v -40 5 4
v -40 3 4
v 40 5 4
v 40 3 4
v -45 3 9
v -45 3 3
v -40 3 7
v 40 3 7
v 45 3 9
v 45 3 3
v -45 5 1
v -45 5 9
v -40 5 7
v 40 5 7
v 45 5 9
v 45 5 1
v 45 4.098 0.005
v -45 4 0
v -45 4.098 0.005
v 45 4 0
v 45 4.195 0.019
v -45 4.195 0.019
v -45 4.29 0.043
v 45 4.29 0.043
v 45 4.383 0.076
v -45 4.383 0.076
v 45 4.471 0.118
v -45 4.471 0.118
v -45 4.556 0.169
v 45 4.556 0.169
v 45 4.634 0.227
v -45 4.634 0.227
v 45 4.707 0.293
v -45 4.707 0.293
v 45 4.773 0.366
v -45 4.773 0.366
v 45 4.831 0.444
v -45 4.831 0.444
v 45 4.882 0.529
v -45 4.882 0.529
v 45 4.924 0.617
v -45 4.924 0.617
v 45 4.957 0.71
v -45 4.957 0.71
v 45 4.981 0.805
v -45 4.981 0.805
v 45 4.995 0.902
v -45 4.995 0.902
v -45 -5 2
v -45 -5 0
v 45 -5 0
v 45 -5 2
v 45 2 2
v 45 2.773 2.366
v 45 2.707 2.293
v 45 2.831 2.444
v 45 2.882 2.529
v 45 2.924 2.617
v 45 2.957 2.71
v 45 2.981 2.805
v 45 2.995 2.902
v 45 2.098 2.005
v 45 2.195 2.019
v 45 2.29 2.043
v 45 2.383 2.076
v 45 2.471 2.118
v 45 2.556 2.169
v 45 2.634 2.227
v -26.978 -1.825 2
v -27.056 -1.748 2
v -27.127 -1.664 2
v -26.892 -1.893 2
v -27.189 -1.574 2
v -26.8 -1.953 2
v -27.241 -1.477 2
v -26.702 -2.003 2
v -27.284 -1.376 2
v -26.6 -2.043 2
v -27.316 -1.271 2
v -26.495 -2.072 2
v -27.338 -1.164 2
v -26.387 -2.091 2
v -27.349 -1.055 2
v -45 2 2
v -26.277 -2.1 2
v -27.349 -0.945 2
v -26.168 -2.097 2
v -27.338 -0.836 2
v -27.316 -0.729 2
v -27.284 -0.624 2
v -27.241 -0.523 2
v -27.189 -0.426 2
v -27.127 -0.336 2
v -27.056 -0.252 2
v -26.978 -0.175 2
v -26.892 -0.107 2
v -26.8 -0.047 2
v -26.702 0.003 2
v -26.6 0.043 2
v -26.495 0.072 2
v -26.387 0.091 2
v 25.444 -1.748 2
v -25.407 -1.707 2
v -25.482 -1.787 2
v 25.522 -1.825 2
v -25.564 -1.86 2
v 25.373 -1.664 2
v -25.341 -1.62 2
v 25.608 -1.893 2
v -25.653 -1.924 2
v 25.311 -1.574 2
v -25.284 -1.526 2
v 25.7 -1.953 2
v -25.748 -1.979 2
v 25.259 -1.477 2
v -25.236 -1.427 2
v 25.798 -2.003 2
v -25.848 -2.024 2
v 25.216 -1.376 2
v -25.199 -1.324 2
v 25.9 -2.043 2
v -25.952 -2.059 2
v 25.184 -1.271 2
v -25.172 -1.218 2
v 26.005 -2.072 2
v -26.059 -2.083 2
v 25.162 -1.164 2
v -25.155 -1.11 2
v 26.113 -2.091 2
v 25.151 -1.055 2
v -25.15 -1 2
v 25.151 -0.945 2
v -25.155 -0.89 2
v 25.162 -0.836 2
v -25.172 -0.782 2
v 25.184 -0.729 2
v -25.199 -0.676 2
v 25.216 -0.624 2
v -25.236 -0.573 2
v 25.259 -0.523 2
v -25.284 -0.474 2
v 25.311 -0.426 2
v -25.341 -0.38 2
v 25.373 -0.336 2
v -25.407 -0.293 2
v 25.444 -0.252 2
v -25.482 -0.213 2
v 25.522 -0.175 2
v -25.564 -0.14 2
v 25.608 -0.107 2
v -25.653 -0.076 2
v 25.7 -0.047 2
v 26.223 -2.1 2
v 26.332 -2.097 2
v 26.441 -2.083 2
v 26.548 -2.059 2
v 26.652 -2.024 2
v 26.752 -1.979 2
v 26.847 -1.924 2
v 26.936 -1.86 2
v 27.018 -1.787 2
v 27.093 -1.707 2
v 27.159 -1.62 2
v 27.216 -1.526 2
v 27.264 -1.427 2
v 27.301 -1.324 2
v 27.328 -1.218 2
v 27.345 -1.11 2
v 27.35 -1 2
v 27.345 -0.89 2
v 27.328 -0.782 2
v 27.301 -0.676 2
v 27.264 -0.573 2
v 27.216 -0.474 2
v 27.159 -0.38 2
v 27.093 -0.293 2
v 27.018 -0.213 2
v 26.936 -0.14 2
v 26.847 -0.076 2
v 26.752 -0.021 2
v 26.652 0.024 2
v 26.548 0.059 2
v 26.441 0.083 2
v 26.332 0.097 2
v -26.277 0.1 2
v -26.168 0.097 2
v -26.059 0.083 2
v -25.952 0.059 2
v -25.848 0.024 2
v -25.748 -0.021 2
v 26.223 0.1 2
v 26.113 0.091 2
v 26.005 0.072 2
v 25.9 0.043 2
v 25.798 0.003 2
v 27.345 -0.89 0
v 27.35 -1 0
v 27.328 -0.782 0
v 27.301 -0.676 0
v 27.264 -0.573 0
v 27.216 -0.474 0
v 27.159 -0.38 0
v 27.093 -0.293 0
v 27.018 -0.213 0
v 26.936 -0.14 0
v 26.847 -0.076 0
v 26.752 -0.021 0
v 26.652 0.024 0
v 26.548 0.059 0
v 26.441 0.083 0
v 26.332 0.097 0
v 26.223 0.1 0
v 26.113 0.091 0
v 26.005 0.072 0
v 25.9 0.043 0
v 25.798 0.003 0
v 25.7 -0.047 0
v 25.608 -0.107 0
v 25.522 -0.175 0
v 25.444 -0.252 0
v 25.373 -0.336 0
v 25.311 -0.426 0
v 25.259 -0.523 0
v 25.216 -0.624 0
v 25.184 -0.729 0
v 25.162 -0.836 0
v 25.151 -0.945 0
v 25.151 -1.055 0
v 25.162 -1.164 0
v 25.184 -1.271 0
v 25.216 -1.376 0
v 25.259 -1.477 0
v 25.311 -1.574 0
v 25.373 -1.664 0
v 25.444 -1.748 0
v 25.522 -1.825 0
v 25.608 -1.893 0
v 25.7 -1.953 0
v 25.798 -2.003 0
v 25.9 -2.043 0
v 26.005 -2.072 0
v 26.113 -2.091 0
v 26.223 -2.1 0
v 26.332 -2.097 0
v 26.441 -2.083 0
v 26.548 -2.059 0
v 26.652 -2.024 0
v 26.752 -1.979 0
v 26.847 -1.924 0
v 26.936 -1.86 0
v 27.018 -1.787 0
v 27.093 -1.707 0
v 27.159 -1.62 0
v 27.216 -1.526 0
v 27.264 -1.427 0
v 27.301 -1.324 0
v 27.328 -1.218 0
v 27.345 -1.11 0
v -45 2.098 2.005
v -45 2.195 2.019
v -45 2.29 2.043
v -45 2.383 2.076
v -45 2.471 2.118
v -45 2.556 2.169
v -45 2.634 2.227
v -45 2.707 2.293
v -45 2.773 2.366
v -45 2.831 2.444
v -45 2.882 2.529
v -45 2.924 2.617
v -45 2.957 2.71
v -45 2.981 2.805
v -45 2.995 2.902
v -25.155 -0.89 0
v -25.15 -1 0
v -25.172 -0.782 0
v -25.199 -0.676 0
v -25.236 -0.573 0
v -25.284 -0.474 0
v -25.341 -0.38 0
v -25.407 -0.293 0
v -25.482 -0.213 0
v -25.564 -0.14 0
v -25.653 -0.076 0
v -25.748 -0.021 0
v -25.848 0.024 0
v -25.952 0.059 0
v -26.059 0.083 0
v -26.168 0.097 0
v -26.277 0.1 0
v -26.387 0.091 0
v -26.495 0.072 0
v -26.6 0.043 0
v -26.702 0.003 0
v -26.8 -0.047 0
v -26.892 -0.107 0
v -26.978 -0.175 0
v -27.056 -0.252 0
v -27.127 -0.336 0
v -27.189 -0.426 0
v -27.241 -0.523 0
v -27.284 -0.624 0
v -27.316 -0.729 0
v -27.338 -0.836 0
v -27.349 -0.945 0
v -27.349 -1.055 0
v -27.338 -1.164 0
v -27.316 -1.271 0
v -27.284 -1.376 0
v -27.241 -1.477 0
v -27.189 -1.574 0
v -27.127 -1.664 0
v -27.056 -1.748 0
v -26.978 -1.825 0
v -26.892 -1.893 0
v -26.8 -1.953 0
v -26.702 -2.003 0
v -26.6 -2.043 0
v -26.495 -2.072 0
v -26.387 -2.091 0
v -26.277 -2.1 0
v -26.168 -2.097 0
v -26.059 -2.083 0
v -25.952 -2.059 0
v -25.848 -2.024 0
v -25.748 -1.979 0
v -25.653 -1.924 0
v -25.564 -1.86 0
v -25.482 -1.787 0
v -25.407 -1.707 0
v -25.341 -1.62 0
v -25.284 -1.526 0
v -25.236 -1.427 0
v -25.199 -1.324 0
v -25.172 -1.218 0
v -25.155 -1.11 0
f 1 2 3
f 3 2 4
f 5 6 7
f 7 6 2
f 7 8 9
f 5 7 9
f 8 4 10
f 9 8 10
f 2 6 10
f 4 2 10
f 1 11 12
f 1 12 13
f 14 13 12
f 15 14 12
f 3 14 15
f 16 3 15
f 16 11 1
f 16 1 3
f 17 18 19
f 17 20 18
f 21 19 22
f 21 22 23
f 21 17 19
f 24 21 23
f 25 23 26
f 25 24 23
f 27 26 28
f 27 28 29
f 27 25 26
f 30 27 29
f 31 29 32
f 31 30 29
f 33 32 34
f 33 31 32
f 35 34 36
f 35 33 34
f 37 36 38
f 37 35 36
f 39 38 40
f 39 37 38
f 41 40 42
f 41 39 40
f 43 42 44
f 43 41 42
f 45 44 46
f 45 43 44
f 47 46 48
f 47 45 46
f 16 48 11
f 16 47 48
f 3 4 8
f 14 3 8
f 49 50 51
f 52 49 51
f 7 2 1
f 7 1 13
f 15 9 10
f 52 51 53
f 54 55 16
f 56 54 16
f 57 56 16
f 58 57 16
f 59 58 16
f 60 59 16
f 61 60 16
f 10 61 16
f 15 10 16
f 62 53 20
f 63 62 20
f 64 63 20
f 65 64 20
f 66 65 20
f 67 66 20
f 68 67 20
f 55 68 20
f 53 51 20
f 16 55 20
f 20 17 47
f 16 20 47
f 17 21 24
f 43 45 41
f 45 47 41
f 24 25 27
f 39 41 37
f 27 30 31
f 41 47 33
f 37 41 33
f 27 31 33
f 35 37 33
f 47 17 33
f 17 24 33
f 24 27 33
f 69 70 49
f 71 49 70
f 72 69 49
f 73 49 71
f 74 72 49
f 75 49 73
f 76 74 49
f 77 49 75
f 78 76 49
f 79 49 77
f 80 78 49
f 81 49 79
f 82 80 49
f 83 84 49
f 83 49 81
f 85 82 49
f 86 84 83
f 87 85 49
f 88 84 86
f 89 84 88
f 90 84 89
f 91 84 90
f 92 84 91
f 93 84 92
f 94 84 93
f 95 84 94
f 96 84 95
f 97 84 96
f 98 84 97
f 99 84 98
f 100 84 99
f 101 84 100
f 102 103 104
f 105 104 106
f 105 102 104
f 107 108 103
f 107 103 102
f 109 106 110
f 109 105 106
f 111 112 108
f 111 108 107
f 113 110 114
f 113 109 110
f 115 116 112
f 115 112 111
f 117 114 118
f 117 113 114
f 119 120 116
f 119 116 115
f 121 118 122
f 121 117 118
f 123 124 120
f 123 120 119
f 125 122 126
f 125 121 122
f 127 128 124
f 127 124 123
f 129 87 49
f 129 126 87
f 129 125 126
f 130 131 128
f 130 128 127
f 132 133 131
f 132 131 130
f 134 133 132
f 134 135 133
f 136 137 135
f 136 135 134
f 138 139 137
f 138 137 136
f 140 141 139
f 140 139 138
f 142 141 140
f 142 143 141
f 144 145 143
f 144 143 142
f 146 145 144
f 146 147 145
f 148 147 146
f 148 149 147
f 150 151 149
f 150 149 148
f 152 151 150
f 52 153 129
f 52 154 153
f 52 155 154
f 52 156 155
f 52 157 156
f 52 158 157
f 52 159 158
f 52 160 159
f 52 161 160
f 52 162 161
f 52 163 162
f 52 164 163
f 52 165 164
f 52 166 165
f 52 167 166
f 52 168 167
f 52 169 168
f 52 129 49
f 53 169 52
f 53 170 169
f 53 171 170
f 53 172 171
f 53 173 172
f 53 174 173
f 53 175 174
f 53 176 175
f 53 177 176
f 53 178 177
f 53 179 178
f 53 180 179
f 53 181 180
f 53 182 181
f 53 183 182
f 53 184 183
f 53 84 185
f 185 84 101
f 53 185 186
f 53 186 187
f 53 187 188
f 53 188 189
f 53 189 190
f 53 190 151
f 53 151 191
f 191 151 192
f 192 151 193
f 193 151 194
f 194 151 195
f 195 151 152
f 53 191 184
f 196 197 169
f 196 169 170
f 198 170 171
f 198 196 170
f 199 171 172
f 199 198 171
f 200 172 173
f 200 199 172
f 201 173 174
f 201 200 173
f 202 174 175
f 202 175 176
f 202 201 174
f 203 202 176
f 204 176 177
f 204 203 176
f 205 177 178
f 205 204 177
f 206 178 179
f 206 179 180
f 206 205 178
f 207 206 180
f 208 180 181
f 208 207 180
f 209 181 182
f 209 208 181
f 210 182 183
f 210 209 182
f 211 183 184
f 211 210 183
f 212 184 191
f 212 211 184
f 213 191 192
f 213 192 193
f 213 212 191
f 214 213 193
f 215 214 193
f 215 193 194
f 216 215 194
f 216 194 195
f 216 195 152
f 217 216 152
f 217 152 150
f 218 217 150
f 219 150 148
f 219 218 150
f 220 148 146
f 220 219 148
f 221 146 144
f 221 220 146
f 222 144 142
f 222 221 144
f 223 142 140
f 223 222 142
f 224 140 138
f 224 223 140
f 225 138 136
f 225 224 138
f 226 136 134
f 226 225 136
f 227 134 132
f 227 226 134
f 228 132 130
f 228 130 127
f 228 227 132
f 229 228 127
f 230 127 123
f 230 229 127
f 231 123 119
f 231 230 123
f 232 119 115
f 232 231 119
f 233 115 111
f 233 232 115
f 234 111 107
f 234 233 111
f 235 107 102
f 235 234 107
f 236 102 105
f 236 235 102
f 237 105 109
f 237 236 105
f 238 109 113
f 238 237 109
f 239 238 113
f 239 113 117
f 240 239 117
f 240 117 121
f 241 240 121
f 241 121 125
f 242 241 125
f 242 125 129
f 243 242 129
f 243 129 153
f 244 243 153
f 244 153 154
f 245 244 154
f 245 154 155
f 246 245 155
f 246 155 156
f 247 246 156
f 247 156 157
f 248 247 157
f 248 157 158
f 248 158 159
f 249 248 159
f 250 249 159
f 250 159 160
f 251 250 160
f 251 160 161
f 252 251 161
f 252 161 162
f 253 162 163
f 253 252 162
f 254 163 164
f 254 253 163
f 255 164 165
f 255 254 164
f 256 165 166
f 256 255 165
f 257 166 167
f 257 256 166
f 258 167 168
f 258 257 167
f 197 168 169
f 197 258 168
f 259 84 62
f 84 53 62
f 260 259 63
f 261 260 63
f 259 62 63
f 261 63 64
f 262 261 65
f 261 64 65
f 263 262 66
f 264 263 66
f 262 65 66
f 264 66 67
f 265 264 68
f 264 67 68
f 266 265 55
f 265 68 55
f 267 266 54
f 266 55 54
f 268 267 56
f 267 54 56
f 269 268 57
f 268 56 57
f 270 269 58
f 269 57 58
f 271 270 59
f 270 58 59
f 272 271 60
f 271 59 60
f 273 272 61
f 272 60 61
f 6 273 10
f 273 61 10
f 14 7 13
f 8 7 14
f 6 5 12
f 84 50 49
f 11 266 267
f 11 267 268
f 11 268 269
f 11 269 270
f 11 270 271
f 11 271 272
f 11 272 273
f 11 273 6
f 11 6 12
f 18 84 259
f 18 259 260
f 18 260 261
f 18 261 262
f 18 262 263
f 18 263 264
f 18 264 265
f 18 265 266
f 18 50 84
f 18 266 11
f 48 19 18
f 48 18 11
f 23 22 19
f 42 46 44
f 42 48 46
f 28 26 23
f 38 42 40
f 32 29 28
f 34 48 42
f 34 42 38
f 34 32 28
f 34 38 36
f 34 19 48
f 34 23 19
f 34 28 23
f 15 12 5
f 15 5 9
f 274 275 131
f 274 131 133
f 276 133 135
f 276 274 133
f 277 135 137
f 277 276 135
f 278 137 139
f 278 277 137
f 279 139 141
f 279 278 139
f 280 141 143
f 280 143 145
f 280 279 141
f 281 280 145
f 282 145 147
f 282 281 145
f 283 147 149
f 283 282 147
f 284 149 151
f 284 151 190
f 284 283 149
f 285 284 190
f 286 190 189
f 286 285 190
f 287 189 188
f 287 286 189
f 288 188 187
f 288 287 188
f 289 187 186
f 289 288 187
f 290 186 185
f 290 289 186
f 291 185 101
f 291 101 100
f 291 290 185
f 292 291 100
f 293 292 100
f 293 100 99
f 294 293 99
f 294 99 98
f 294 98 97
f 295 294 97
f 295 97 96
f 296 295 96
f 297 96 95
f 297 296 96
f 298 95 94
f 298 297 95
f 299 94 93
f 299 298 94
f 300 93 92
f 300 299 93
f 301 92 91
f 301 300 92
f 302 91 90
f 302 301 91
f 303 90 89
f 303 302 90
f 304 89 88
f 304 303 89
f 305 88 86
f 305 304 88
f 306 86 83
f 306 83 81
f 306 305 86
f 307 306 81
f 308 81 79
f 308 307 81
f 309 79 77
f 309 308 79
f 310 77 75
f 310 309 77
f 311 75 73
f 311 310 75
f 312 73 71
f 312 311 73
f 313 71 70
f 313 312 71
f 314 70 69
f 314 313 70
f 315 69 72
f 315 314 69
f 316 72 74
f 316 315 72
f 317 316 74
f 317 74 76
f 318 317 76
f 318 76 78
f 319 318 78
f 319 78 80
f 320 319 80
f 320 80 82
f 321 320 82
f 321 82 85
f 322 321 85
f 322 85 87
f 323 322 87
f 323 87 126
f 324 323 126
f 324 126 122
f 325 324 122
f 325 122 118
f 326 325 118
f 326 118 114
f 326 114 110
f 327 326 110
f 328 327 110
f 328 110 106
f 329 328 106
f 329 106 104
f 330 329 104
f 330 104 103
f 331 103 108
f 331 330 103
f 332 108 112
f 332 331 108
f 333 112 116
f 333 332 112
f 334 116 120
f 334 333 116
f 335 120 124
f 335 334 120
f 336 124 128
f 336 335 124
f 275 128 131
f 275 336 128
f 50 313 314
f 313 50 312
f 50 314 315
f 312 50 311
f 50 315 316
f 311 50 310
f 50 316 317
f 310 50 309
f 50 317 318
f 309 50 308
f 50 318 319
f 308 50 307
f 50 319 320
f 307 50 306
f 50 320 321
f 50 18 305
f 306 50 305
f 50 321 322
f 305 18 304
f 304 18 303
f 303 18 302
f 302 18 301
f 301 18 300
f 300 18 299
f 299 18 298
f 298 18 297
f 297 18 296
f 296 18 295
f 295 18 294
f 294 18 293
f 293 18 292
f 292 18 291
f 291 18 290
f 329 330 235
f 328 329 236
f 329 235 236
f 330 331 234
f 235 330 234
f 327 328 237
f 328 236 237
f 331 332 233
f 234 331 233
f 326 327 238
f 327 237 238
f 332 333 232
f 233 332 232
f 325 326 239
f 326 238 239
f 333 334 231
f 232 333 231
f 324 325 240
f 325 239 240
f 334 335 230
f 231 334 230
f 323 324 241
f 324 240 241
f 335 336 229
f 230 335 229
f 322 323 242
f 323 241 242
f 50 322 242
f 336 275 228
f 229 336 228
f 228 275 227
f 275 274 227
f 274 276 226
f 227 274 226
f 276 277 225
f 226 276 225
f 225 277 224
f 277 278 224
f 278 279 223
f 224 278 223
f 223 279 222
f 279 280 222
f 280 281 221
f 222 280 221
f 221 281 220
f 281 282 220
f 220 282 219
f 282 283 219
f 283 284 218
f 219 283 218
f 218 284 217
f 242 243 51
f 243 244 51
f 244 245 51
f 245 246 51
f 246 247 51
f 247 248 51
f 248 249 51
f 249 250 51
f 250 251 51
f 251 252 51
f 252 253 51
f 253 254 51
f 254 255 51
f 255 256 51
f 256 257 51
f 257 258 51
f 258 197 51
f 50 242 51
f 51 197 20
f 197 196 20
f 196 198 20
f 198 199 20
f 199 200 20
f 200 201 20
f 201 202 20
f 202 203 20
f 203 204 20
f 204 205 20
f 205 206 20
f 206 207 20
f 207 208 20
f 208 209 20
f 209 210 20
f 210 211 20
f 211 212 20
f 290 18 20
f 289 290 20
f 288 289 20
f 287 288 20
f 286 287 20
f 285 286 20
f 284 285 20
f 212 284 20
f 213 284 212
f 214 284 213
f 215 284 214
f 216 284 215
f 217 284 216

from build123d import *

# Parameters (mm, degrees)
F0_W     = 90
F0_H     = 10
F0_R     = 1.1
F1_DEPTH = 2
F2_W     = 90
F2_H     = 2
F3_DEPTH = 7
F4_R     = 1
F5_W     = 80
F5_H     = 3
F6_DEPTH = 2


with BuildPart() as f1:
    # F0 (on Top) → F1 (new body)
    with BuildSketch(Plane.XY):
        Rectangle(F0_W, F0_H)
        with Locations((-26.25, -1)):
            Circle(F0_R, mode=Mode.SUBTRACT)
        with Locations((26.25, -1)):
            Circle(F0_R, mode=Mode.SUBTRACT)
    extrude(amount=F1_DEPTH)

    # F2 (on face) → F3 (join)
    with BuildSketch(Plane.XY.offset(2)):
        with Locations((0, 4)):
            Rectangle(F2_W, F2_H)
    extrude(amount=F3_DEPTH)

    # F4
    f4_edges = [f1.edges().sort_by_distance(p)[0] for p in [
        (0, 5, 0),
        (0, 3, 2),
    ]]
    fillet(f4_edges, radius=F4_R)

    # F5 (on face) → F6 (cut)
    with BuildSketch(Plane.XZ.offset(-3)):
        with Locations((0, 5.5)):
            Rectangle(F5_W, F5_H)
    extrude(amount=-F6_DEPTH, mode=Mode.SUBTRACT)


solid = f1.part
